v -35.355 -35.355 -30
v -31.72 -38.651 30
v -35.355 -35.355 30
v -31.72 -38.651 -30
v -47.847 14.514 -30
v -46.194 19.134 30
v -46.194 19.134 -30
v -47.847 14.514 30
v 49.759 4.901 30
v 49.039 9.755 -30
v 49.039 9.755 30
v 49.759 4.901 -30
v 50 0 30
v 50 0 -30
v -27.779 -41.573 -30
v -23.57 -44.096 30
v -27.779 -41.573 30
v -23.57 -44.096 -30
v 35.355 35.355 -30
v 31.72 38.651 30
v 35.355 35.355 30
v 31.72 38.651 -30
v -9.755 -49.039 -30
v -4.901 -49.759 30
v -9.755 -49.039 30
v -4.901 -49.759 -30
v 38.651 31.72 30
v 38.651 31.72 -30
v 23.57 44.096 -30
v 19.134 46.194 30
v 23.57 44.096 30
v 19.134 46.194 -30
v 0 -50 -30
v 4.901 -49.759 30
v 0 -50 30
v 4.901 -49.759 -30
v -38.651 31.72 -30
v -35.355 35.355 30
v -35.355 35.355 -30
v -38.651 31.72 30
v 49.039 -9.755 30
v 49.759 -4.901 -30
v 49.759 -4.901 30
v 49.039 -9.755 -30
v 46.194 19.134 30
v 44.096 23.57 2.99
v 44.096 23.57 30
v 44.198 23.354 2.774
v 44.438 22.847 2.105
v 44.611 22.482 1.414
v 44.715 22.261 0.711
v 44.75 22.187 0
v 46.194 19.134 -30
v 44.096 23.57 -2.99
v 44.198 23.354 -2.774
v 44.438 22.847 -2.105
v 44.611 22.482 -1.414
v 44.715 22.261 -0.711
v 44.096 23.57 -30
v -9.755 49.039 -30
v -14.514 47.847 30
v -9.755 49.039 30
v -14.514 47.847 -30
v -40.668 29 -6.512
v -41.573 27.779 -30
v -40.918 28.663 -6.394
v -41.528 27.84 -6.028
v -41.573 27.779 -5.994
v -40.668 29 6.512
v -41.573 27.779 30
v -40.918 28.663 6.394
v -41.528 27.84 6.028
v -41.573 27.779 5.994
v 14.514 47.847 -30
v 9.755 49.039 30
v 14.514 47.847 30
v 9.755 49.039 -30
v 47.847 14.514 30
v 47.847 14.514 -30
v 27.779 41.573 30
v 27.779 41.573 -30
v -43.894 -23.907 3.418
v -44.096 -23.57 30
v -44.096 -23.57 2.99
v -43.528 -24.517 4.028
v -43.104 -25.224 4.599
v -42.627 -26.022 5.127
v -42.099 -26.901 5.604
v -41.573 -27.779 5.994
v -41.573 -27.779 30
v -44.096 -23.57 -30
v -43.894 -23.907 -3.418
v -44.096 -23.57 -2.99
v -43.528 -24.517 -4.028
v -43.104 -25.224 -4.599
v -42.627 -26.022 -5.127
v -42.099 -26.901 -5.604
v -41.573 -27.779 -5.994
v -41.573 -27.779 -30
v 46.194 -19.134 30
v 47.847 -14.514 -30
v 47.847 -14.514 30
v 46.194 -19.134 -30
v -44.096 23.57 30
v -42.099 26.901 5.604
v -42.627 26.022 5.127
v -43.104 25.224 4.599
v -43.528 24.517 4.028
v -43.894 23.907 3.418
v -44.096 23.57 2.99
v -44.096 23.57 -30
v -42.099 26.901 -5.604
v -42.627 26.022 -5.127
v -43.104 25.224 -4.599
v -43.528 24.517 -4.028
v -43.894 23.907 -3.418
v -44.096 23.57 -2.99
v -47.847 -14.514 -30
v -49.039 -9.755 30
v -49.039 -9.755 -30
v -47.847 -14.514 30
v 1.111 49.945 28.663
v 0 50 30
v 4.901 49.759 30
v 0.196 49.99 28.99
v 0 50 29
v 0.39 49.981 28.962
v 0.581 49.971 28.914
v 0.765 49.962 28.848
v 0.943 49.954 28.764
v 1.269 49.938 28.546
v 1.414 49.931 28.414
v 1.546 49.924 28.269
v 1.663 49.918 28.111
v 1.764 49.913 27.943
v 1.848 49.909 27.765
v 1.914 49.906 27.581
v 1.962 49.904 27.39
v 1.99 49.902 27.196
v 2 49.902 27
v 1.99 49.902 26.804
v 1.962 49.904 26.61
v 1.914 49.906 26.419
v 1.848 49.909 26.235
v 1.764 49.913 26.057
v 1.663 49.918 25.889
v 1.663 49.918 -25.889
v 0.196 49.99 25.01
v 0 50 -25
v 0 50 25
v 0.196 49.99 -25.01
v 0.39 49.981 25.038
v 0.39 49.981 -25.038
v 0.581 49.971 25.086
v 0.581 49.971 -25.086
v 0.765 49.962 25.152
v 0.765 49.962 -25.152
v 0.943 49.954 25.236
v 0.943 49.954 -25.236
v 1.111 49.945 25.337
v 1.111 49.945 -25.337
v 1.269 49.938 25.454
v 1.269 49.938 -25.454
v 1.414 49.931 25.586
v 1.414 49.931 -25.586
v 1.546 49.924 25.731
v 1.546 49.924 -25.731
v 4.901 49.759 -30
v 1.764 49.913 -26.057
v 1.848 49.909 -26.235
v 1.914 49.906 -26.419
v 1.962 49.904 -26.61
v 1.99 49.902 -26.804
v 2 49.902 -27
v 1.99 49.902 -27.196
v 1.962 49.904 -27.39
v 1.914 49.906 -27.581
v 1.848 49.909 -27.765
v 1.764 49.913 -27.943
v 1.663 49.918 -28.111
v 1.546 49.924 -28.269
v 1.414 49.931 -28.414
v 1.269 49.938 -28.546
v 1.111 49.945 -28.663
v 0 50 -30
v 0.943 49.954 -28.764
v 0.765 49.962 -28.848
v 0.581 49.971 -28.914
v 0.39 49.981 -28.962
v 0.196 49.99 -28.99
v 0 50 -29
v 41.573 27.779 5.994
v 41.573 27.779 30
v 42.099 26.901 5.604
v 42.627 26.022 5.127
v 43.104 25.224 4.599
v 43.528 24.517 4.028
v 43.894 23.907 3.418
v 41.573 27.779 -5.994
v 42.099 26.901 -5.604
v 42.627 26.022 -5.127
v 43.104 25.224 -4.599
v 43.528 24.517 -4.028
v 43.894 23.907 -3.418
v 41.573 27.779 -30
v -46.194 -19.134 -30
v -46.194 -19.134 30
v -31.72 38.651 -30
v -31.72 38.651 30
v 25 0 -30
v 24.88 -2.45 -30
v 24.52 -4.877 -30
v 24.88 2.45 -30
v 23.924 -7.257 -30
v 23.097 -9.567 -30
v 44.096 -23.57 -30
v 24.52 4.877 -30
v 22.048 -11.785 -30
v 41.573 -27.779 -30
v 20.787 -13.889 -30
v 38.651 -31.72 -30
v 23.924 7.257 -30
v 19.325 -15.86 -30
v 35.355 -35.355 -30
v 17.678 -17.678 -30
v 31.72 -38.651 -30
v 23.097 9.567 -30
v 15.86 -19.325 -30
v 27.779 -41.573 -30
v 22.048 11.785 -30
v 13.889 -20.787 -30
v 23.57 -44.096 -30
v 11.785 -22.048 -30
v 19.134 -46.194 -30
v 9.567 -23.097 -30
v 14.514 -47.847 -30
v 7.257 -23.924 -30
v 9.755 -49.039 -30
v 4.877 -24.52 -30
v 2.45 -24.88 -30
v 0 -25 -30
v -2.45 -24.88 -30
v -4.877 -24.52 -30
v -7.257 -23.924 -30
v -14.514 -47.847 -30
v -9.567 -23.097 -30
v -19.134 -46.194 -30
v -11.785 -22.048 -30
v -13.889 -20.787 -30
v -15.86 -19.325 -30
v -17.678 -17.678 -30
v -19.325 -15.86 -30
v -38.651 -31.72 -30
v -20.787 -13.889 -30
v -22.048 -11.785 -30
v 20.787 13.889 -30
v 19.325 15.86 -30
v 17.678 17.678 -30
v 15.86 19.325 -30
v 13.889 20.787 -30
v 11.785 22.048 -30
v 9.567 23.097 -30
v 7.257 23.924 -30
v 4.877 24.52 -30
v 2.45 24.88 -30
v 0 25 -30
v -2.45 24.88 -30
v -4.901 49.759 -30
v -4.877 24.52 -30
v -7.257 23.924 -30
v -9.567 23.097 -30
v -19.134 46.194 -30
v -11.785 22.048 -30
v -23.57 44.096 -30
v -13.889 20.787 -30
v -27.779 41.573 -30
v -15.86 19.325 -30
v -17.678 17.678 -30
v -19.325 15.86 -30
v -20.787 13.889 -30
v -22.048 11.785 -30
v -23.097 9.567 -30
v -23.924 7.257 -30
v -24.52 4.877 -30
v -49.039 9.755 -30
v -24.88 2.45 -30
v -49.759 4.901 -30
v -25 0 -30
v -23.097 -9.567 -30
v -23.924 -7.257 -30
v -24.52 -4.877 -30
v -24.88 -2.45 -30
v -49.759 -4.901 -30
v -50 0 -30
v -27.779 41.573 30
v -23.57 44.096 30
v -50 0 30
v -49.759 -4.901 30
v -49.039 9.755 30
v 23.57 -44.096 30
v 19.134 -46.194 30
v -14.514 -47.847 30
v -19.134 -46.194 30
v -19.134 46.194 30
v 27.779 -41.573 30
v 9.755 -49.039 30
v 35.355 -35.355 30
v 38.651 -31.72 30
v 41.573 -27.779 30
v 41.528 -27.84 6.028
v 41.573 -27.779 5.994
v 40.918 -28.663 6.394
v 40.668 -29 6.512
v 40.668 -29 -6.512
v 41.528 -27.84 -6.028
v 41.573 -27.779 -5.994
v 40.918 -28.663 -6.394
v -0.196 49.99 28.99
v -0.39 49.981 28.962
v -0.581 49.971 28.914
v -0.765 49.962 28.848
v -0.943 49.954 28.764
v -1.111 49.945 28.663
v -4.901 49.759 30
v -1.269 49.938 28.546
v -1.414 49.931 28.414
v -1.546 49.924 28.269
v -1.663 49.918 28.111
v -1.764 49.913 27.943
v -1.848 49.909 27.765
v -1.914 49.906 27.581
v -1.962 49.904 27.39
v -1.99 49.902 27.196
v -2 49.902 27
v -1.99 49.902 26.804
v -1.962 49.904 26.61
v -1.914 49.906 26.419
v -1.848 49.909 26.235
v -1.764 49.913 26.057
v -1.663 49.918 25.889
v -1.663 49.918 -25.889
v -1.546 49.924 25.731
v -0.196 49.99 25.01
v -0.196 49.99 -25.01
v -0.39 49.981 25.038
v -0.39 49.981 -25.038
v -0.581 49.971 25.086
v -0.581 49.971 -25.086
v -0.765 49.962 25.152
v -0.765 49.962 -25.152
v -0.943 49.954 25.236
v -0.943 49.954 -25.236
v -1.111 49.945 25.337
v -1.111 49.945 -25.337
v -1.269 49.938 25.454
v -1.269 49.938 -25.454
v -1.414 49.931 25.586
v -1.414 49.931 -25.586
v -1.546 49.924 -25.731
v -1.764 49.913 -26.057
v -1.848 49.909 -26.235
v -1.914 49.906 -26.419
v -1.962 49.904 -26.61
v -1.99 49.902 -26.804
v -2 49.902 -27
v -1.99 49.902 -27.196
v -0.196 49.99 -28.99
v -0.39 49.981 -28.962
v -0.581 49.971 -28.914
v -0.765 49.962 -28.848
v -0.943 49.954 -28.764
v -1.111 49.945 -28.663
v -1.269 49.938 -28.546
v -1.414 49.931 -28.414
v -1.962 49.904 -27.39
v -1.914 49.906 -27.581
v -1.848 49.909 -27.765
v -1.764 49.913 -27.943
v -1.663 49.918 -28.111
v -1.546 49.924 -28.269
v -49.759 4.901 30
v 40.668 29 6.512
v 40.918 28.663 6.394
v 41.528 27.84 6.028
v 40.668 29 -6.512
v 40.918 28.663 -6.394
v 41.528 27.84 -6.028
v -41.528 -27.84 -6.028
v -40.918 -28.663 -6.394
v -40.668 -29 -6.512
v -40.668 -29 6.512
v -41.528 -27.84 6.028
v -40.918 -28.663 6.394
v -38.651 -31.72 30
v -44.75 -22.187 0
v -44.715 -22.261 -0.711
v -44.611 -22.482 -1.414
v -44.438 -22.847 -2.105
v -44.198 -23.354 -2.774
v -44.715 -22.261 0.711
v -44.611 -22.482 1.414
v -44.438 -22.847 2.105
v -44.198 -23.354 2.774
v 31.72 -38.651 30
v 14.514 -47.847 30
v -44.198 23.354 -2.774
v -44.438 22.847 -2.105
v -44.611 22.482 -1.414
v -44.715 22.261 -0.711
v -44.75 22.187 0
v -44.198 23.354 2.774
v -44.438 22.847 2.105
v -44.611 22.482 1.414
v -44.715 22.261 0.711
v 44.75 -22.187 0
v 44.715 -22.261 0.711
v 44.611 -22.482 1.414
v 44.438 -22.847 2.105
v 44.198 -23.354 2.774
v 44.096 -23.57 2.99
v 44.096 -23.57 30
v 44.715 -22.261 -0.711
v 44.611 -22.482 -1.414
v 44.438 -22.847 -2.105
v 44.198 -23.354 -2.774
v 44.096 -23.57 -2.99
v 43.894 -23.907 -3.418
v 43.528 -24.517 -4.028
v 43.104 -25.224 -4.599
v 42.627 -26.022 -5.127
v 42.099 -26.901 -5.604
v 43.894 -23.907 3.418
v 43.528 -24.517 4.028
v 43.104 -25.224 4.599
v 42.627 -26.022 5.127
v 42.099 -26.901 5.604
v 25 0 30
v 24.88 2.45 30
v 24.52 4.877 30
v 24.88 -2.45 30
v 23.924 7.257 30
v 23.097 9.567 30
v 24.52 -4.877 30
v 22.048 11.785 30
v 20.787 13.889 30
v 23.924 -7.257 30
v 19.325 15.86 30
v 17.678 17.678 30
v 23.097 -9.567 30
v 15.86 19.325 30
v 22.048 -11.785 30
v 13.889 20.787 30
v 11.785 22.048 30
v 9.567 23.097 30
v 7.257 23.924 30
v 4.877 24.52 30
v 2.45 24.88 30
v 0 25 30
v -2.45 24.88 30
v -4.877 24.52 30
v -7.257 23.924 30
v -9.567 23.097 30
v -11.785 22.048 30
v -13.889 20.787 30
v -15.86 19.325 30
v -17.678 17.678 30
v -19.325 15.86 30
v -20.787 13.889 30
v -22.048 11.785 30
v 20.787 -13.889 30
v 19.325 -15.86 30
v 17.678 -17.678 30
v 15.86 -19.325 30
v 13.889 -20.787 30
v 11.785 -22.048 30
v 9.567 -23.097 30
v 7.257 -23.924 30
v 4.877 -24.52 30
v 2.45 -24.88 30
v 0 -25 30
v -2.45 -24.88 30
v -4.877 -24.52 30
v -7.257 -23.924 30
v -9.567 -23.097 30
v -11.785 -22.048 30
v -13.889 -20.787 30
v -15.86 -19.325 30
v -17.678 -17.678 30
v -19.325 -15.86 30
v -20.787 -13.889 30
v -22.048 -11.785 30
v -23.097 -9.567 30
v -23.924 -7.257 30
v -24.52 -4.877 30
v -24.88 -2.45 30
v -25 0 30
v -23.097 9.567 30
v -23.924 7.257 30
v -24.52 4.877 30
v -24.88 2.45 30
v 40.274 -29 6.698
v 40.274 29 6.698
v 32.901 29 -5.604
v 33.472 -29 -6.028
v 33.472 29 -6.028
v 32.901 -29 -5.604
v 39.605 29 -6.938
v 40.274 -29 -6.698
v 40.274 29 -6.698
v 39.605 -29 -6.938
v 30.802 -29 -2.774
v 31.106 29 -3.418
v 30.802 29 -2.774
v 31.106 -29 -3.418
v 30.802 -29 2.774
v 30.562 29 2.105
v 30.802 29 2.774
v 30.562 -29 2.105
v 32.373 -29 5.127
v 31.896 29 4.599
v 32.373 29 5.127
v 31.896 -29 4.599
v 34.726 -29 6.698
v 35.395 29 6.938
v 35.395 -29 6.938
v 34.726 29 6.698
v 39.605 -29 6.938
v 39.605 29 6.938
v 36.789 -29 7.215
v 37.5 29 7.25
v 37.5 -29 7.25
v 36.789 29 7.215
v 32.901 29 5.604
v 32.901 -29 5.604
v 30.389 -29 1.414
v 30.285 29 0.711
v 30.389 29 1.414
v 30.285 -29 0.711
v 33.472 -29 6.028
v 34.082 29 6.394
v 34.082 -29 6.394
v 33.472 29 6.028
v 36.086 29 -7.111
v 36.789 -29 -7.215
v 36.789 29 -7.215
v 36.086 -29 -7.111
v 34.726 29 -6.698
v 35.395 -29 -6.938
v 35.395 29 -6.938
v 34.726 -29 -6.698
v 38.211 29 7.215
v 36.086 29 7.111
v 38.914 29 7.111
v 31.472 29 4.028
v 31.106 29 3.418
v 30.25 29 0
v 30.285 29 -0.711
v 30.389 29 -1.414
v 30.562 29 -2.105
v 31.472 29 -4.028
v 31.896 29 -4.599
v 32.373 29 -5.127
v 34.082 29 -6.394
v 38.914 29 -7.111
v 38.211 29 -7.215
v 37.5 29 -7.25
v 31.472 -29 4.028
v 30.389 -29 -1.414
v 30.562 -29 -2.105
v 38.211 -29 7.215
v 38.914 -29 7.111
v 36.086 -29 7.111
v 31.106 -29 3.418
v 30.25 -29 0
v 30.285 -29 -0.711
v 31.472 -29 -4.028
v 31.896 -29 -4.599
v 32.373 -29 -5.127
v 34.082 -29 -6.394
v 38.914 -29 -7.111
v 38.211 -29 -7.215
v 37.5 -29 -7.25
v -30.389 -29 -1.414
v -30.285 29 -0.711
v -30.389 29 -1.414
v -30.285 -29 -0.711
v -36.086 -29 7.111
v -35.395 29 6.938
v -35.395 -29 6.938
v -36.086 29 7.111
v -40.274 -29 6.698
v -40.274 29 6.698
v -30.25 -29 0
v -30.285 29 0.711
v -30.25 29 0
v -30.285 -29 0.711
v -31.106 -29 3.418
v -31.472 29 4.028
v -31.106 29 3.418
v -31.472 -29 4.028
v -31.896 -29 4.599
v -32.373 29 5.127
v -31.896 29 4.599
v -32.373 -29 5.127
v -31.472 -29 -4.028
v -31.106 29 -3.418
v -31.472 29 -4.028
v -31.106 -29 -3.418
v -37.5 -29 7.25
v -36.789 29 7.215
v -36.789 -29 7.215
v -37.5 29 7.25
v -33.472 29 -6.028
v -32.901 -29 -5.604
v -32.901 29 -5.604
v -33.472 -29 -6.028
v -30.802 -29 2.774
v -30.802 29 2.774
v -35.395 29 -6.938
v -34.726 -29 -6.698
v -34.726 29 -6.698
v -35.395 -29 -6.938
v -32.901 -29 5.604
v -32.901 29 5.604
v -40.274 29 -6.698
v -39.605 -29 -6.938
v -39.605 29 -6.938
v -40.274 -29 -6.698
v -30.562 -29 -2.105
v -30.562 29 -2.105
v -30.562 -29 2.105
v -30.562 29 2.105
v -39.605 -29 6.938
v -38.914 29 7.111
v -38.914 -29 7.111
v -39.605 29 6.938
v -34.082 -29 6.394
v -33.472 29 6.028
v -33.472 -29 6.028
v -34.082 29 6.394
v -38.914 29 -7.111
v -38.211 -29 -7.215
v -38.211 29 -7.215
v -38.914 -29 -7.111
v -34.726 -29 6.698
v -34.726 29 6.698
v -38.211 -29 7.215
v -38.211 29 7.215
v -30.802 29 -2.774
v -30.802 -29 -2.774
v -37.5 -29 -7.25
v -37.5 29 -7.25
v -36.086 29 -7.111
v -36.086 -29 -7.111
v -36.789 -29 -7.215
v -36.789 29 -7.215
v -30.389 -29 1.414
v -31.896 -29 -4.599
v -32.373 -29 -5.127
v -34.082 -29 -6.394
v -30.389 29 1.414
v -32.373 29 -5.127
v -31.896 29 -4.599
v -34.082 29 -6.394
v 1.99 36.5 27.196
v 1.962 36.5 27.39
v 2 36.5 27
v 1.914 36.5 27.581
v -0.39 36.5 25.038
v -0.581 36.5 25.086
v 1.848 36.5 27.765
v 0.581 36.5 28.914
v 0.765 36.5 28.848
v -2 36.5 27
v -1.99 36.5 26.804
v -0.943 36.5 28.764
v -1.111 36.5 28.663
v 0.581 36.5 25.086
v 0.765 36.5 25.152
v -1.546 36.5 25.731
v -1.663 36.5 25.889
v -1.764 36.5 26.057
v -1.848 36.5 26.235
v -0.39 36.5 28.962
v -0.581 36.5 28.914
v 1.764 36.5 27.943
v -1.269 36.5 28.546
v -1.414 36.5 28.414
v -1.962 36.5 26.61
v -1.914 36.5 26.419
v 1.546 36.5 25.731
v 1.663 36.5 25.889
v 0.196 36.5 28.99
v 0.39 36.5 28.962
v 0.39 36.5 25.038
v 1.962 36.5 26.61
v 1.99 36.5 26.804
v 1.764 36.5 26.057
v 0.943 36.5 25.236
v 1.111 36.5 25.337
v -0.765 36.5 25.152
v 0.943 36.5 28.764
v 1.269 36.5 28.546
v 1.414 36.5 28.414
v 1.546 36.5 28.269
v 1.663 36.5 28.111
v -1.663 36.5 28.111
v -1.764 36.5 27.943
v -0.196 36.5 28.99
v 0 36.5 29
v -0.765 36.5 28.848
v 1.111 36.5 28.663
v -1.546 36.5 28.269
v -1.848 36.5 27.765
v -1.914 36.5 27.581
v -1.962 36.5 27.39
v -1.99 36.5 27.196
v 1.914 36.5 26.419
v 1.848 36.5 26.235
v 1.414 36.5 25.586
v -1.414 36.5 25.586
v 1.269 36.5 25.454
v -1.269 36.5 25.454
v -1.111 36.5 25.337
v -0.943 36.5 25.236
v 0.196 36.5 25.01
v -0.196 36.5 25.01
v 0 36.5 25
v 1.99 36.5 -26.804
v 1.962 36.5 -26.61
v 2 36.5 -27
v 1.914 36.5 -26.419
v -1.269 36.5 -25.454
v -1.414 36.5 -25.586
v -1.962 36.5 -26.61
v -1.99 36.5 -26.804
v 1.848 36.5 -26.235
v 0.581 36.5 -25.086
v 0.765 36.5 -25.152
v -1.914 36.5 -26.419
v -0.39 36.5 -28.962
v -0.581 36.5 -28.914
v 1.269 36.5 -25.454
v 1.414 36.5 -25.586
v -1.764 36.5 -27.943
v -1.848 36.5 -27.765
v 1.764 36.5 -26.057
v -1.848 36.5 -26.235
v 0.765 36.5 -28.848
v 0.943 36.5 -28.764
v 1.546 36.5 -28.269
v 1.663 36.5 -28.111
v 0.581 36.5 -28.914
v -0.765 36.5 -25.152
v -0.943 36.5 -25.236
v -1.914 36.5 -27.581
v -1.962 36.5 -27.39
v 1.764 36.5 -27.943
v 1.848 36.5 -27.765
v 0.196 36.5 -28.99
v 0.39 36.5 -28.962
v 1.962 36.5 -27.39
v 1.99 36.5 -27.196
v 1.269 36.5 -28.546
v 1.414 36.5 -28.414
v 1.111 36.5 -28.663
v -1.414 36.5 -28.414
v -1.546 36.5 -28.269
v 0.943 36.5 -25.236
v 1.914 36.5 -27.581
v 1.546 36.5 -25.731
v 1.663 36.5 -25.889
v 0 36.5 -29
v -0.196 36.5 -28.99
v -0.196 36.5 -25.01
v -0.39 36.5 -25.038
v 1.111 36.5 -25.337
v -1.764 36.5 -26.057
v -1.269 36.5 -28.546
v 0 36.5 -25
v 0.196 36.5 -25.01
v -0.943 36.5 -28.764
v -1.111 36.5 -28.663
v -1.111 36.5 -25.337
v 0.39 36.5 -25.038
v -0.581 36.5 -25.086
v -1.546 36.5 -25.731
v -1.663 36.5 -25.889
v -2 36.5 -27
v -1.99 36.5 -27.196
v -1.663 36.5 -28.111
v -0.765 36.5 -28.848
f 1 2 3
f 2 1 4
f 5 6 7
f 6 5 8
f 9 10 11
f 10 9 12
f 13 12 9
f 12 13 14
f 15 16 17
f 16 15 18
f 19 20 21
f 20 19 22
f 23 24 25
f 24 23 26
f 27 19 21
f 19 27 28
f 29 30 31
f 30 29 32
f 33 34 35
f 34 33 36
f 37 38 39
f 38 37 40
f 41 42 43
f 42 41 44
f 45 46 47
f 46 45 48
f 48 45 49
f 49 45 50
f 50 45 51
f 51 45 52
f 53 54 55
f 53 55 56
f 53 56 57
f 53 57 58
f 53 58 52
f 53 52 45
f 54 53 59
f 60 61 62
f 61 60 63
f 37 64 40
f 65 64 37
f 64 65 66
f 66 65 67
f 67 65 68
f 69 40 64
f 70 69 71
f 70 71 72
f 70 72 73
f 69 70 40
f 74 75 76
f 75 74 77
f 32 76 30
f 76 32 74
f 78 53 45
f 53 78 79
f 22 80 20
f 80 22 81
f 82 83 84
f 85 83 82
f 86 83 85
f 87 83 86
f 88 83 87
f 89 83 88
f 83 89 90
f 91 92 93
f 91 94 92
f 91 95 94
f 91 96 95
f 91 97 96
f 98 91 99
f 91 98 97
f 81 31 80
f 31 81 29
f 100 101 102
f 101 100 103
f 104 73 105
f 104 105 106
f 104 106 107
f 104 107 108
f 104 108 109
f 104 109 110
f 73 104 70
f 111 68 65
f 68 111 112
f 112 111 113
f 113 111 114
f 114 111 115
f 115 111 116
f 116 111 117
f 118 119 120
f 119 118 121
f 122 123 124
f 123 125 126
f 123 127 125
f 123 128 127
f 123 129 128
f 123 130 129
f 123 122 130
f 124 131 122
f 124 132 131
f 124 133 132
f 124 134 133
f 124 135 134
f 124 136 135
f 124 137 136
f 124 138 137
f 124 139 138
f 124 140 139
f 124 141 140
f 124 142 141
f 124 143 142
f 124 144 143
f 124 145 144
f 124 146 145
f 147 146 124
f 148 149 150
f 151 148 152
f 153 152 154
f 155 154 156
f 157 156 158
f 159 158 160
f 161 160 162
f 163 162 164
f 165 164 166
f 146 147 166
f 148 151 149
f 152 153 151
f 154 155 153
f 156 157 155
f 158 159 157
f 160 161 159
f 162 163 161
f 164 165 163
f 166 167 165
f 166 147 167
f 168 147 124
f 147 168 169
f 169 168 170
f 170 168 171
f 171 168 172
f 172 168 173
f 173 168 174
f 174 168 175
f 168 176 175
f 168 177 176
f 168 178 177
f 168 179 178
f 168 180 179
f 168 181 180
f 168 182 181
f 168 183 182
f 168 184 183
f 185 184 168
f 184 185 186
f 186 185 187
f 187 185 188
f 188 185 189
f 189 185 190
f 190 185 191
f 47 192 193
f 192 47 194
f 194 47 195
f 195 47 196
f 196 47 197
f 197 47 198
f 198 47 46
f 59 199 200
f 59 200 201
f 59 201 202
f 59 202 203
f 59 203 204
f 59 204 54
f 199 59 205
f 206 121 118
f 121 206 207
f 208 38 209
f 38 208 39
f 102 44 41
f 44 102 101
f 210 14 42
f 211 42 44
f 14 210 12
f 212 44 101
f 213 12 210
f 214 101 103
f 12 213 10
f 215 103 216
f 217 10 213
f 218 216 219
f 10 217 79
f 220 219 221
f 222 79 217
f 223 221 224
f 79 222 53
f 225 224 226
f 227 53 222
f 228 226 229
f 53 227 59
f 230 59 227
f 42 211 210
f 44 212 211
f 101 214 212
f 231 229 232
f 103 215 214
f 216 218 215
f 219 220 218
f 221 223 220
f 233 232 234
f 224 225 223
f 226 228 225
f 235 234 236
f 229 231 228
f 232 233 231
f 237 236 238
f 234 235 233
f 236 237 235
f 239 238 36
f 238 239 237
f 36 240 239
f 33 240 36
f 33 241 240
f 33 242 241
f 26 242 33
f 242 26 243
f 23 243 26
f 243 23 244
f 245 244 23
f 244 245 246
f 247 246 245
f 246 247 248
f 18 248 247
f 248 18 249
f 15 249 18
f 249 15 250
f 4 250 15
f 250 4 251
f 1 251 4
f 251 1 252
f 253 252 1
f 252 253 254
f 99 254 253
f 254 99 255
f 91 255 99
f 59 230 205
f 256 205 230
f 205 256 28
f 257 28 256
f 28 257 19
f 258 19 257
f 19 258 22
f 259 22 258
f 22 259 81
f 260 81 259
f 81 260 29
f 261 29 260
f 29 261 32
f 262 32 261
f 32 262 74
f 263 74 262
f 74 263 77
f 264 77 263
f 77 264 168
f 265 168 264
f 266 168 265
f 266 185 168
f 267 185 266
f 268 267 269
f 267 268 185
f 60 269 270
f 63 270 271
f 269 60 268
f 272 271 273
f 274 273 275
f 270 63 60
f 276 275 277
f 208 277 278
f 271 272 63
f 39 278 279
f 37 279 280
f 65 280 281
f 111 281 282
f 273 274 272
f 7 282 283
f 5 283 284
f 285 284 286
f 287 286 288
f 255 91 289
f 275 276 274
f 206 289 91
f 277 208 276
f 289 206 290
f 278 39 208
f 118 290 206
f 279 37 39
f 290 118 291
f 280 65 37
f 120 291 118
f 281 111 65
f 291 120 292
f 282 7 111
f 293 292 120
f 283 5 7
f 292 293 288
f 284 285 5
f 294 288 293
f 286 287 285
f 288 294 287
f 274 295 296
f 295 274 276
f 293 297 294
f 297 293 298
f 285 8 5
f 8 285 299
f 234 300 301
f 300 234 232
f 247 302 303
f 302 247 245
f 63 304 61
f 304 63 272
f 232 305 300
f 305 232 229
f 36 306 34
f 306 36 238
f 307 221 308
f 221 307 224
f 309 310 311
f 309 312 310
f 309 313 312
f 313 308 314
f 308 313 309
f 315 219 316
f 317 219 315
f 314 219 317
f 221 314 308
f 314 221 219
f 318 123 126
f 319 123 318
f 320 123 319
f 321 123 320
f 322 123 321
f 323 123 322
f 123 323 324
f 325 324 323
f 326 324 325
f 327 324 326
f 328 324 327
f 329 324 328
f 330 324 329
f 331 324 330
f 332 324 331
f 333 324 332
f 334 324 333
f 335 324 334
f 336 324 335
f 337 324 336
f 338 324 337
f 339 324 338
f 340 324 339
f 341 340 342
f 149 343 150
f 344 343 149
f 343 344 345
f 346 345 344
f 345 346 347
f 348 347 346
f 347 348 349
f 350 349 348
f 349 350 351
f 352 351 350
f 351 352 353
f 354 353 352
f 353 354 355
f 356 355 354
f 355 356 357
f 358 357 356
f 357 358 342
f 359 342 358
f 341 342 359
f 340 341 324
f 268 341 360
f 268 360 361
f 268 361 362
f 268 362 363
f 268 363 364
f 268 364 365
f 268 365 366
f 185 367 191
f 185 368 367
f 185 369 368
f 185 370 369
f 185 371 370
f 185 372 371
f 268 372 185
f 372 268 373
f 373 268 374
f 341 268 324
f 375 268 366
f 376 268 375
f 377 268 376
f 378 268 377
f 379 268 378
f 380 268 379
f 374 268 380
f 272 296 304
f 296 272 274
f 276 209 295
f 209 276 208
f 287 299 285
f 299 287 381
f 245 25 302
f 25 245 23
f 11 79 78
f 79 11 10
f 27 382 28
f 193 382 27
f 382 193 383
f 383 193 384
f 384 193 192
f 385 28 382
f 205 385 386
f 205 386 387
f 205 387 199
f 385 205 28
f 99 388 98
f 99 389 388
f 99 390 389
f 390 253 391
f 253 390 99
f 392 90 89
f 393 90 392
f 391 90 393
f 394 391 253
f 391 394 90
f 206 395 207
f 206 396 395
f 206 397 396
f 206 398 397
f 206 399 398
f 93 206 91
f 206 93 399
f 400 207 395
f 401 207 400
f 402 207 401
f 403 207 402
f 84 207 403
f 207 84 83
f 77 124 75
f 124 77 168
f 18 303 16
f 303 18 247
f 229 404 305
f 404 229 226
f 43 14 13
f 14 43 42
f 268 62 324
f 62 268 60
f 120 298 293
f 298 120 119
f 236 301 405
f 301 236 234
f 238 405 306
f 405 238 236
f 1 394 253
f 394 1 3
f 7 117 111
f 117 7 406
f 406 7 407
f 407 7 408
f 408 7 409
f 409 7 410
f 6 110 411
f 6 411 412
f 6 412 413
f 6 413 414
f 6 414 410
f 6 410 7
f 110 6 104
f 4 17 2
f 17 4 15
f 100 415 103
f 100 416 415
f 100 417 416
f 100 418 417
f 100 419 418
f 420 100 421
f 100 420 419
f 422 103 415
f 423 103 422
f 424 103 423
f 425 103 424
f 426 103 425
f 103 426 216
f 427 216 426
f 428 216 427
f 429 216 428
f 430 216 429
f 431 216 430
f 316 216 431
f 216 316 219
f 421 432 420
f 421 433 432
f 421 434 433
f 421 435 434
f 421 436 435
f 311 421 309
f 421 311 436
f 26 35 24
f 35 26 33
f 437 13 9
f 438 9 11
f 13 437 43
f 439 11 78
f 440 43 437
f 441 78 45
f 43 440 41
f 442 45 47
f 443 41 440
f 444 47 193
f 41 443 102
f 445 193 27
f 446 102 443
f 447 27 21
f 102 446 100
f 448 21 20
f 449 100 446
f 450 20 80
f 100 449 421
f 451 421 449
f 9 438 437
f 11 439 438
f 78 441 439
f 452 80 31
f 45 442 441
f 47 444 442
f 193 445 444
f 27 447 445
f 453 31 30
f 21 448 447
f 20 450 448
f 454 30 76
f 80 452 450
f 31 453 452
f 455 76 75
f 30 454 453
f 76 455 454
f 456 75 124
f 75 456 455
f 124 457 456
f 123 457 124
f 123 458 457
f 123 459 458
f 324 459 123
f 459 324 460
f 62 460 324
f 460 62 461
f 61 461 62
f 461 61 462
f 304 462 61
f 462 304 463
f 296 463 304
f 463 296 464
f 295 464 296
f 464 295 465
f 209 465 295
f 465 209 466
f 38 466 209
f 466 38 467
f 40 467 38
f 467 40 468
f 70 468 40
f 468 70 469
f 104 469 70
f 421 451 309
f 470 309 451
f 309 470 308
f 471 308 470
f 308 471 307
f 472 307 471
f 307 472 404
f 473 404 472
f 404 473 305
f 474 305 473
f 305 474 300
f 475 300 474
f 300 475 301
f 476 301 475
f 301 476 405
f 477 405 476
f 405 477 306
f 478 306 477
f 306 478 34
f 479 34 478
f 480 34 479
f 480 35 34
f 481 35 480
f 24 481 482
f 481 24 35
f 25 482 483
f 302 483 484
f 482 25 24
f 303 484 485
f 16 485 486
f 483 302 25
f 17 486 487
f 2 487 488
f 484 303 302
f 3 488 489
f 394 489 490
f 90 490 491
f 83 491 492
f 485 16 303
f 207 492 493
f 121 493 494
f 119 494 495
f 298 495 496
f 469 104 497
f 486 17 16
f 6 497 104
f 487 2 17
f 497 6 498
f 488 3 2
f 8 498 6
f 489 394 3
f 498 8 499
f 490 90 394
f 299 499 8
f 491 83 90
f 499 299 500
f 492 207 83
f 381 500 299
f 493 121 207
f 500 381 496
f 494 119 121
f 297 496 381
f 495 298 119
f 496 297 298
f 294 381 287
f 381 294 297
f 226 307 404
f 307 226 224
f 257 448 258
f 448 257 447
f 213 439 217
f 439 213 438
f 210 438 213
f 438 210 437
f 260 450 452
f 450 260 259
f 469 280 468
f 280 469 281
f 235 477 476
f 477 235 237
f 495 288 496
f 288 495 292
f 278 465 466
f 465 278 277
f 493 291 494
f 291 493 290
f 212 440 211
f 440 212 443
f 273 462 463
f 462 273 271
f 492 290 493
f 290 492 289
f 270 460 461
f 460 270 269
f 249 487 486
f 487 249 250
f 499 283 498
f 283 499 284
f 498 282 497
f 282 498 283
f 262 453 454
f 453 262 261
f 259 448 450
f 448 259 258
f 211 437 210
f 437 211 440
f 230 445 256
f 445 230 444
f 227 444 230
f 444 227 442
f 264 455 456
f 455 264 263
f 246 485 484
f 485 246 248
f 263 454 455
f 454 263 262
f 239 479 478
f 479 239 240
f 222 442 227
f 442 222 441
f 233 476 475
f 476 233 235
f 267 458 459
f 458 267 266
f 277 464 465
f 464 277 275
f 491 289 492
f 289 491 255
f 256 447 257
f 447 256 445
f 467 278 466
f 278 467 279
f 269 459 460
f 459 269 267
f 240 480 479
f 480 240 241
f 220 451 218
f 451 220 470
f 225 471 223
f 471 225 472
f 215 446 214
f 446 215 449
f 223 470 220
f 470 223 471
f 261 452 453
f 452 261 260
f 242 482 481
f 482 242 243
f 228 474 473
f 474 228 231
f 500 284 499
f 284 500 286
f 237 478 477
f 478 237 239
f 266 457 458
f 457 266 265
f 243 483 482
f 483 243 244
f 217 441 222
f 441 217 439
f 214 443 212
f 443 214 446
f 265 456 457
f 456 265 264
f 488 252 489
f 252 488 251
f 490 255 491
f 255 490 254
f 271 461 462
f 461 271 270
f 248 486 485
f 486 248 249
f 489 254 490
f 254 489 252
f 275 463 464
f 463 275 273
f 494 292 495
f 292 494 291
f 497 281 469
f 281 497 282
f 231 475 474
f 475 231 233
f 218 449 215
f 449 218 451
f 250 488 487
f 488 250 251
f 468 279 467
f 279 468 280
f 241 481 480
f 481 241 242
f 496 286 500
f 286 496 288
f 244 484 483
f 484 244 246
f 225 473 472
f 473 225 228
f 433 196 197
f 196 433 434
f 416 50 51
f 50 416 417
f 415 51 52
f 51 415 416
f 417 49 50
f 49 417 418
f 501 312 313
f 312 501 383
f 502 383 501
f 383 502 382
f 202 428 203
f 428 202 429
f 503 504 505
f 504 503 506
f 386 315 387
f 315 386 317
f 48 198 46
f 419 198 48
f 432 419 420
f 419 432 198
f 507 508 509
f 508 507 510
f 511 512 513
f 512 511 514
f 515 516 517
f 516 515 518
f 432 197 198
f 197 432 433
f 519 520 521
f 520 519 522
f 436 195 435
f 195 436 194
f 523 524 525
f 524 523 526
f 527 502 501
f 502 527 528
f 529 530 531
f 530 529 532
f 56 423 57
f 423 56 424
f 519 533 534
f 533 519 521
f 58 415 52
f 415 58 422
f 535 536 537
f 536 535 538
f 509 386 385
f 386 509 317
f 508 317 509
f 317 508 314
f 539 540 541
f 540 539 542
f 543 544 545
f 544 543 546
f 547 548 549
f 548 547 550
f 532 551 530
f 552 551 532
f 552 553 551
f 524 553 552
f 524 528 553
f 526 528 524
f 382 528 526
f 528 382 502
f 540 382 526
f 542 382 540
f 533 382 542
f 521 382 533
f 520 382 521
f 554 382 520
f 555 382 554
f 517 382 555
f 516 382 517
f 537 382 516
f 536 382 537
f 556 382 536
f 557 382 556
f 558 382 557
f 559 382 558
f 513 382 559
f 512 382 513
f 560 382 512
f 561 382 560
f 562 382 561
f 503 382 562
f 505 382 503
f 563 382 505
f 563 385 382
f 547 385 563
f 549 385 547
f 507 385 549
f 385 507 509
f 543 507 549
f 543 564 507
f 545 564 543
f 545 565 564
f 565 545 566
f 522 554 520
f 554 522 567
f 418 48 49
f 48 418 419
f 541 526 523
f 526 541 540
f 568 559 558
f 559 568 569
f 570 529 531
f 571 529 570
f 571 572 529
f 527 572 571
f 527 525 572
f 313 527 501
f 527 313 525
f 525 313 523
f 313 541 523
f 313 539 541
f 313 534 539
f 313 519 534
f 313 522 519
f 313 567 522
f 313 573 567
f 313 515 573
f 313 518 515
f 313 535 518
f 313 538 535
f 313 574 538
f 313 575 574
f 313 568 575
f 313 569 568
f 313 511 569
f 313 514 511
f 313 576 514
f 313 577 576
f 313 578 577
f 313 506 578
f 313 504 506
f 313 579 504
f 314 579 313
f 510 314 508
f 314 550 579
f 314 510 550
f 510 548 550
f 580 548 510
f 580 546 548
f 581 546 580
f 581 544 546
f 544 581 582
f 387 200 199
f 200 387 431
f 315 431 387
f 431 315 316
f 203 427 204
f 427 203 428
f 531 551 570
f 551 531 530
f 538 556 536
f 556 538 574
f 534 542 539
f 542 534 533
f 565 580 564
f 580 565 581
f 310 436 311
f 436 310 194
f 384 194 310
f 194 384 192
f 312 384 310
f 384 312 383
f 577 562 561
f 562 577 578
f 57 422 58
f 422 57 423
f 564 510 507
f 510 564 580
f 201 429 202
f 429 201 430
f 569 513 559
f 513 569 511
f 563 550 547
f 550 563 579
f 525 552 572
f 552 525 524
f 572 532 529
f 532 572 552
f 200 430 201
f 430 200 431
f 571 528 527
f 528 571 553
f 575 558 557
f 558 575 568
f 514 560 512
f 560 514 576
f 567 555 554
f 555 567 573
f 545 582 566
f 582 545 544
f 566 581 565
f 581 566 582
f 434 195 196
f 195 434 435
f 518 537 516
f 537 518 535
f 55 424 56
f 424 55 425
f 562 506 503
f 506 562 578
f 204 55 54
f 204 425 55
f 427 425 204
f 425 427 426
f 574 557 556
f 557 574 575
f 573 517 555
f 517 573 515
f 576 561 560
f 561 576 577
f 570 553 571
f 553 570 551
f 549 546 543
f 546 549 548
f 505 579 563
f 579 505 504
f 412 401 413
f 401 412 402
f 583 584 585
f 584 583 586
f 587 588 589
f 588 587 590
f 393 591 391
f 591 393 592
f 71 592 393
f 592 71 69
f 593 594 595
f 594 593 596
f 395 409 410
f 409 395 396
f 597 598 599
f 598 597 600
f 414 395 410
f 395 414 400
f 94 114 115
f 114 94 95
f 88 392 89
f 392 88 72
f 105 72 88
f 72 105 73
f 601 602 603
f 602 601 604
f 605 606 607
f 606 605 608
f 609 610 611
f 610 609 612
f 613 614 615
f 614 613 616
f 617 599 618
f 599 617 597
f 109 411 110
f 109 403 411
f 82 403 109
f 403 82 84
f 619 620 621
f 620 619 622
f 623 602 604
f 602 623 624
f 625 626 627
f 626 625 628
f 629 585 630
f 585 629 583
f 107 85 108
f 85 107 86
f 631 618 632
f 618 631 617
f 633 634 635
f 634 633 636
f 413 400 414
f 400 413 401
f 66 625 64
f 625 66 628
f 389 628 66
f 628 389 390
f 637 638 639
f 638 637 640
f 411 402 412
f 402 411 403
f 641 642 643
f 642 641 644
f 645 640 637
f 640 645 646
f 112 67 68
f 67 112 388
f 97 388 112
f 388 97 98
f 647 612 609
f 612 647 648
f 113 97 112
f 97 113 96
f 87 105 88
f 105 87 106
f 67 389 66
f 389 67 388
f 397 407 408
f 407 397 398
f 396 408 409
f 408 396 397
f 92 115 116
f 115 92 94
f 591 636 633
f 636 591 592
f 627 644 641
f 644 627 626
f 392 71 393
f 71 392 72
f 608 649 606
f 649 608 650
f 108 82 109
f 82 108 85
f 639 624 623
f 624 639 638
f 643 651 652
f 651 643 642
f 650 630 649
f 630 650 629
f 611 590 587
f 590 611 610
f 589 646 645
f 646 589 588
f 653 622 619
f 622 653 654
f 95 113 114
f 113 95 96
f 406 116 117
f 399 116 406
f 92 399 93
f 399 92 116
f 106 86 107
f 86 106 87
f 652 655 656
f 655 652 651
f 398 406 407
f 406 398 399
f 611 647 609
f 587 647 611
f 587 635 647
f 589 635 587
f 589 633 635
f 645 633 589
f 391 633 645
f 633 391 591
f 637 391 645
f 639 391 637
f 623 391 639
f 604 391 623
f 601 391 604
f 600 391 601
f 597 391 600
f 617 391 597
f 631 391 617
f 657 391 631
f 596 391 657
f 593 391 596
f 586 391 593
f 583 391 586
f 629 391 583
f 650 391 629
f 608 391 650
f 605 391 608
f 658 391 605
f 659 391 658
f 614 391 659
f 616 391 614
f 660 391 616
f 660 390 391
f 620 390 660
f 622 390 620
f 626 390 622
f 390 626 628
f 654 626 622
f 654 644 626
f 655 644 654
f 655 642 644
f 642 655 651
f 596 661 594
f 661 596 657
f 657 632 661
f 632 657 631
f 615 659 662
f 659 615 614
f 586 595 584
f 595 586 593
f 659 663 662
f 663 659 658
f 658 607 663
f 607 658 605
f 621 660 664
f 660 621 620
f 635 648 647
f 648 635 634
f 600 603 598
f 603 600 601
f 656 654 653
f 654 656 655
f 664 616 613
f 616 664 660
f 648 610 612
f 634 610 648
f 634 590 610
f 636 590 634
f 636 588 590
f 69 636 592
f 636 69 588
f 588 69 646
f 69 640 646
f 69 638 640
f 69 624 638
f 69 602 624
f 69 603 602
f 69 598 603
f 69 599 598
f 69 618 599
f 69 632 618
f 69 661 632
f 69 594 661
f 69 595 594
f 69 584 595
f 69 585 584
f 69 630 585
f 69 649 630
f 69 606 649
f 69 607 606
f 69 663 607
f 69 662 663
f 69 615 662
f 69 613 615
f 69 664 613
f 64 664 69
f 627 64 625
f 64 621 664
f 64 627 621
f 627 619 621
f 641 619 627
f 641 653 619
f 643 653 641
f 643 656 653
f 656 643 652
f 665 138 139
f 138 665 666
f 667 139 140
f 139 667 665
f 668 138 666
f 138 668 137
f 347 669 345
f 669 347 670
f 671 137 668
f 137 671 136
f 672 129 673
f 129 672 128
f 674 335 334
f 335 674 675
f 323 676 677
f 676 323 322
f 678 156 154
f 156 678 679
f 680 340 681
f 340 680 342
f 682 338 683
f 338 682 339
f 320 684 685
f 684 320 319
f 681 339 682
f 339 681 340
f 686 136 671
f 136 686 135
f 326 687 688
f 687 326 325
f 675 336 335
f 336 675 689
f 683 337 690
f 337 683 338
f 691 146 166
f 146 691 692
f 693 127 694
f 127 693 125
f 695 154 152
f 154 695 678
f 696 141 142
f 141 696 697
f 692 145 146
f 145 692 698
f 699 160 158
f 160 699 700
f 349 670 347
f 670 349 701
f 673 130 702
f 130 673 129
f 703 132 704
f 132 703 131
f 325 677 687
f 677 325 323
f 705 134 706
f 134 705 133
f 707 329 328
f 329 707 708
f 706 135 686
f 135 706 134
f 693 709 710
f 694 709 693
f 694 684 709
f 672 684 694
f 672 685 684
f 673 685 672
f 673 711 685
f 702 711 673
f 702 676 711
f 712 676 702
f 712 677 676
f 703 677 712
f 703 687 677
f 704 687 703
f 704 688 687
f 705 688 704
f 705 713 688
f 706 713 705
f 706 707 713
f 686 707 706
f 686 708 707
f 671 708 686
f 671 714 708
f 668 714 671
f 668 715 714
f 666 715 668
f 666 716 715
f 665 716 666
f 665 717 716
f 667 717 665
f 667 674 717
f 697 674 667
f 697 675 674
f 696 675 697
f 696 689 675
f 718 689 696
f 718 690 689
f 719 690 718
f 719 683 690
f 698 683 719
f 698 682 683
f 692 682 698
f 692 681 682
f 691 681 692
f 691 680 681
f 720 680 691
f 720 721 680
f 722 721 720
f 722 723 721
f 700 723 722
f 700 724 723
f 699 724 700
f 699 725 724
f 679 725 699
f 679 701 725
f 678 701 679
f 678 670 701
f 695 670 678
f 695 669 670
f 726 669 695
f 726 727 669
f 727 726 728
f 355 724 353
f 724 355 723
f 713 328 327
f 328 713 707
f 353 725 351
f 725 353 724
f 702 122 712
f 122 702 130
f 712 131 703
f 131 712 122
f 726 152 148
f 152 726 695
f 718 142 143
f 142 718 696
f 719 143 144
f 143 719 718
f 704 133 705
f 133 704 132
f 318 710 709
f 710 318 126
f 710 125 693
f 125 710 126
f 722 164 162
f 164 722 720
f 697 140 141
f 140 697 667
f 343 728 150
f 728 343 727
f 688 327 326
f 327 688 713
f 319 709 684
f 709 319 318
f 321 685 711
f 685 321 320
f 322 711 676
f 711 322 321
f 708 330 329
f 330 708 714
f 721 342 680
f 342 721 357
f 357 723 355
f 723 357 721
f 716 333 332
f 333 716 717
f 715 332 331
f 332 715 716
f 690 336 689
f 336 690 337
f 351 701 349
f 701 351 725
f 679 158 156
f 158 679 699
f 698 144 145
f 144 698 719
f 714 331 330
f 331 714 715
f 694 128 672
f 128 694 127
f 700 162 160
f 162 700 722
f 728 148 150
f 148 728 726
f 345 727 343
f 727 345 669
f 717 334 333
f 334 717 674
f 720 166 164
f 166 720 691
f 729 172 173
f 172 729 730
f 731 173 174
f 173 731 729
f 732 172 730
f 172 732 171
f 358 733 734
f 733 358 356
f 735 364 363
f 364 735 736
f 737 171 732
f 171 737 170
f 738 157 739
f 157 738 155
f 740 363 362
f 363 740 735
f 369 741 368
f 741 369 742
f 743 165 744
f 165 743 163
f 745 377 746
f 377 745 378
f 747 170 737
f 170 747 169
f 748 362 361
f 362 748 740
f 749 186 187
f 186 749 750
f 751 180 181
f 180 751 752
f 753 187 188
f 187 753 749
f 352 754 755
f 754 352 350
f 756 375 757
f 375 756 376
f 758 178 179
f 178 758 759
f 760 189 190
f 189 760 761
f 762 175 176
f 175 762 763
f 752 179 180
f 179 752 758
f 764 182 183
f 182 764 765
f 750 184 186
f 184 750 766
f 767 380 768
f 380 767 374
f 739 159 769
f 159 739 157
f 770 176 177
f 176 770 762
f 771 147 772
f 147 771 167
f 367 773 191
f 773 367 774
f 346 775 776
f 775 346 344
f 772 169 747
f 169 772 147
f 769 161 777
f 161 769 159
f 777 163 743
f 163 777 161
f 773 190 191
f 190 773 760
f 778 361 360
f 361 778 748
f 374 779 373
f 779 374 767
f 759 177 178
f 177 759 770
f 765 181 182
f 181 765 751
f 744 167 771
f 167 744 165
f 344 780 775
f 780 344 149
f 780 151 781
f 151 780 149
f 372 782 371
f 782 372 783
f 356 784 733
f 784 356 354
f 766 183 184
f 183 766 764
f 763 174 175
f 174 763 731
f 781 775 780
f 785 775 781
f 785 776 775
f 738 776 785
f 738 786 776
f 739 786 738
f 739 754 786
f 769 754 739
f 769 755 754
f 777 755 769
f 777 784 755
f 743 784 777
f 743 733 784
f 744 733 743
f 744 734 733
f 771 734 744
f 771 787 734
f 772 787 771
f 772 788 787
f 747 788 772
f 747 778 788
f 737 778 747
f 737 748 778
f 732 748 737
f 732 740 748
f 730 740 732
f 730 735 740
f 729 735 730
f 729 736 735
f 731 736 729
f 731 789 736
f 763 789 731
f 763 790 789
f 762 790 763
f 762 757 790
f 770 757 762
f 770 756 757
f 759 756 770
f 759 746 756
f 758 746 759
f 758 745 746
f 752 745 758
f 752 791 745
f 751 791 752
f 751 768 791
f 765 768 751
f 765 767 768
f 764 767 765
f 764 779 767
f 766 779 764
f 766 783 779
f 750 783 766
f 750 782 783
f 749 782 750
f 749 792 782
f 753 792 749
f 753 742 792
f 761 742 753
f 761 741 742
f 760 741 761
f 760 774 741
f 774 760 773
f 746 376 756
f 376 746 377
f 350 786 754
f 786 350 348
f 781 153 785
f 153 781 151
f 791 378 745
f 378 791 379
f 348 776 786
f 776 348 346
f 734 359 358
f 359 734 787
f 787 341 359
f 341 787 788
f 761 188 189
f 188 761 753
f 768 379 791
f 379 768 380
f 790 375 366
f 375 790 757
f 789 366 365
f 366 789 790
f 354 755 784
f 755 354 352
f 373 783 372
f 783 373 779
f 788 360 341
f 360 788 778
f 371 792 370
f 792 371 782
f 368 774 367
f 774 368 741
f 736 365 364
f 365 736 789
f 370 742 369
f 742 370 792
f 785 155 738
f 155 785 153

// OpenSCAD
// COBRA Vertebra - S1 V24
// Height: 60.0mm, OD: 100.0mm

$fn = 64;

difference() {
    // Outer cylinder
    cylinder(h=60.0, d=100.0, center=true);
    
    // Inner channel
    cylinder(h=62.0, d=50.0, center=true);

    // Battery cavity 1
    rotate([0, 0, 0])
    translate([37.5, 0, 0])
    rotate([90, 0, 0])
    cylinder(h=58.0, d=14.5, center=true);

    // Battery cavity 2
    rotate([0, 0, 180])
    translate([37.5, 0, 0])
    rotate([90, 0, 0])
    cylinder(h=58.0, d=14.5, center=true);

    // Pivot holes
    translate([0, 50.0, 27.0])
    rotate([90, 0, 0])
    cylinder(h=27.0, d=4, center=true);
    
    translate([0, 50.0, -27.0])
    rotate([90, 0, 0])
    cylinder(h=27.0, d=4, center=true);
}
